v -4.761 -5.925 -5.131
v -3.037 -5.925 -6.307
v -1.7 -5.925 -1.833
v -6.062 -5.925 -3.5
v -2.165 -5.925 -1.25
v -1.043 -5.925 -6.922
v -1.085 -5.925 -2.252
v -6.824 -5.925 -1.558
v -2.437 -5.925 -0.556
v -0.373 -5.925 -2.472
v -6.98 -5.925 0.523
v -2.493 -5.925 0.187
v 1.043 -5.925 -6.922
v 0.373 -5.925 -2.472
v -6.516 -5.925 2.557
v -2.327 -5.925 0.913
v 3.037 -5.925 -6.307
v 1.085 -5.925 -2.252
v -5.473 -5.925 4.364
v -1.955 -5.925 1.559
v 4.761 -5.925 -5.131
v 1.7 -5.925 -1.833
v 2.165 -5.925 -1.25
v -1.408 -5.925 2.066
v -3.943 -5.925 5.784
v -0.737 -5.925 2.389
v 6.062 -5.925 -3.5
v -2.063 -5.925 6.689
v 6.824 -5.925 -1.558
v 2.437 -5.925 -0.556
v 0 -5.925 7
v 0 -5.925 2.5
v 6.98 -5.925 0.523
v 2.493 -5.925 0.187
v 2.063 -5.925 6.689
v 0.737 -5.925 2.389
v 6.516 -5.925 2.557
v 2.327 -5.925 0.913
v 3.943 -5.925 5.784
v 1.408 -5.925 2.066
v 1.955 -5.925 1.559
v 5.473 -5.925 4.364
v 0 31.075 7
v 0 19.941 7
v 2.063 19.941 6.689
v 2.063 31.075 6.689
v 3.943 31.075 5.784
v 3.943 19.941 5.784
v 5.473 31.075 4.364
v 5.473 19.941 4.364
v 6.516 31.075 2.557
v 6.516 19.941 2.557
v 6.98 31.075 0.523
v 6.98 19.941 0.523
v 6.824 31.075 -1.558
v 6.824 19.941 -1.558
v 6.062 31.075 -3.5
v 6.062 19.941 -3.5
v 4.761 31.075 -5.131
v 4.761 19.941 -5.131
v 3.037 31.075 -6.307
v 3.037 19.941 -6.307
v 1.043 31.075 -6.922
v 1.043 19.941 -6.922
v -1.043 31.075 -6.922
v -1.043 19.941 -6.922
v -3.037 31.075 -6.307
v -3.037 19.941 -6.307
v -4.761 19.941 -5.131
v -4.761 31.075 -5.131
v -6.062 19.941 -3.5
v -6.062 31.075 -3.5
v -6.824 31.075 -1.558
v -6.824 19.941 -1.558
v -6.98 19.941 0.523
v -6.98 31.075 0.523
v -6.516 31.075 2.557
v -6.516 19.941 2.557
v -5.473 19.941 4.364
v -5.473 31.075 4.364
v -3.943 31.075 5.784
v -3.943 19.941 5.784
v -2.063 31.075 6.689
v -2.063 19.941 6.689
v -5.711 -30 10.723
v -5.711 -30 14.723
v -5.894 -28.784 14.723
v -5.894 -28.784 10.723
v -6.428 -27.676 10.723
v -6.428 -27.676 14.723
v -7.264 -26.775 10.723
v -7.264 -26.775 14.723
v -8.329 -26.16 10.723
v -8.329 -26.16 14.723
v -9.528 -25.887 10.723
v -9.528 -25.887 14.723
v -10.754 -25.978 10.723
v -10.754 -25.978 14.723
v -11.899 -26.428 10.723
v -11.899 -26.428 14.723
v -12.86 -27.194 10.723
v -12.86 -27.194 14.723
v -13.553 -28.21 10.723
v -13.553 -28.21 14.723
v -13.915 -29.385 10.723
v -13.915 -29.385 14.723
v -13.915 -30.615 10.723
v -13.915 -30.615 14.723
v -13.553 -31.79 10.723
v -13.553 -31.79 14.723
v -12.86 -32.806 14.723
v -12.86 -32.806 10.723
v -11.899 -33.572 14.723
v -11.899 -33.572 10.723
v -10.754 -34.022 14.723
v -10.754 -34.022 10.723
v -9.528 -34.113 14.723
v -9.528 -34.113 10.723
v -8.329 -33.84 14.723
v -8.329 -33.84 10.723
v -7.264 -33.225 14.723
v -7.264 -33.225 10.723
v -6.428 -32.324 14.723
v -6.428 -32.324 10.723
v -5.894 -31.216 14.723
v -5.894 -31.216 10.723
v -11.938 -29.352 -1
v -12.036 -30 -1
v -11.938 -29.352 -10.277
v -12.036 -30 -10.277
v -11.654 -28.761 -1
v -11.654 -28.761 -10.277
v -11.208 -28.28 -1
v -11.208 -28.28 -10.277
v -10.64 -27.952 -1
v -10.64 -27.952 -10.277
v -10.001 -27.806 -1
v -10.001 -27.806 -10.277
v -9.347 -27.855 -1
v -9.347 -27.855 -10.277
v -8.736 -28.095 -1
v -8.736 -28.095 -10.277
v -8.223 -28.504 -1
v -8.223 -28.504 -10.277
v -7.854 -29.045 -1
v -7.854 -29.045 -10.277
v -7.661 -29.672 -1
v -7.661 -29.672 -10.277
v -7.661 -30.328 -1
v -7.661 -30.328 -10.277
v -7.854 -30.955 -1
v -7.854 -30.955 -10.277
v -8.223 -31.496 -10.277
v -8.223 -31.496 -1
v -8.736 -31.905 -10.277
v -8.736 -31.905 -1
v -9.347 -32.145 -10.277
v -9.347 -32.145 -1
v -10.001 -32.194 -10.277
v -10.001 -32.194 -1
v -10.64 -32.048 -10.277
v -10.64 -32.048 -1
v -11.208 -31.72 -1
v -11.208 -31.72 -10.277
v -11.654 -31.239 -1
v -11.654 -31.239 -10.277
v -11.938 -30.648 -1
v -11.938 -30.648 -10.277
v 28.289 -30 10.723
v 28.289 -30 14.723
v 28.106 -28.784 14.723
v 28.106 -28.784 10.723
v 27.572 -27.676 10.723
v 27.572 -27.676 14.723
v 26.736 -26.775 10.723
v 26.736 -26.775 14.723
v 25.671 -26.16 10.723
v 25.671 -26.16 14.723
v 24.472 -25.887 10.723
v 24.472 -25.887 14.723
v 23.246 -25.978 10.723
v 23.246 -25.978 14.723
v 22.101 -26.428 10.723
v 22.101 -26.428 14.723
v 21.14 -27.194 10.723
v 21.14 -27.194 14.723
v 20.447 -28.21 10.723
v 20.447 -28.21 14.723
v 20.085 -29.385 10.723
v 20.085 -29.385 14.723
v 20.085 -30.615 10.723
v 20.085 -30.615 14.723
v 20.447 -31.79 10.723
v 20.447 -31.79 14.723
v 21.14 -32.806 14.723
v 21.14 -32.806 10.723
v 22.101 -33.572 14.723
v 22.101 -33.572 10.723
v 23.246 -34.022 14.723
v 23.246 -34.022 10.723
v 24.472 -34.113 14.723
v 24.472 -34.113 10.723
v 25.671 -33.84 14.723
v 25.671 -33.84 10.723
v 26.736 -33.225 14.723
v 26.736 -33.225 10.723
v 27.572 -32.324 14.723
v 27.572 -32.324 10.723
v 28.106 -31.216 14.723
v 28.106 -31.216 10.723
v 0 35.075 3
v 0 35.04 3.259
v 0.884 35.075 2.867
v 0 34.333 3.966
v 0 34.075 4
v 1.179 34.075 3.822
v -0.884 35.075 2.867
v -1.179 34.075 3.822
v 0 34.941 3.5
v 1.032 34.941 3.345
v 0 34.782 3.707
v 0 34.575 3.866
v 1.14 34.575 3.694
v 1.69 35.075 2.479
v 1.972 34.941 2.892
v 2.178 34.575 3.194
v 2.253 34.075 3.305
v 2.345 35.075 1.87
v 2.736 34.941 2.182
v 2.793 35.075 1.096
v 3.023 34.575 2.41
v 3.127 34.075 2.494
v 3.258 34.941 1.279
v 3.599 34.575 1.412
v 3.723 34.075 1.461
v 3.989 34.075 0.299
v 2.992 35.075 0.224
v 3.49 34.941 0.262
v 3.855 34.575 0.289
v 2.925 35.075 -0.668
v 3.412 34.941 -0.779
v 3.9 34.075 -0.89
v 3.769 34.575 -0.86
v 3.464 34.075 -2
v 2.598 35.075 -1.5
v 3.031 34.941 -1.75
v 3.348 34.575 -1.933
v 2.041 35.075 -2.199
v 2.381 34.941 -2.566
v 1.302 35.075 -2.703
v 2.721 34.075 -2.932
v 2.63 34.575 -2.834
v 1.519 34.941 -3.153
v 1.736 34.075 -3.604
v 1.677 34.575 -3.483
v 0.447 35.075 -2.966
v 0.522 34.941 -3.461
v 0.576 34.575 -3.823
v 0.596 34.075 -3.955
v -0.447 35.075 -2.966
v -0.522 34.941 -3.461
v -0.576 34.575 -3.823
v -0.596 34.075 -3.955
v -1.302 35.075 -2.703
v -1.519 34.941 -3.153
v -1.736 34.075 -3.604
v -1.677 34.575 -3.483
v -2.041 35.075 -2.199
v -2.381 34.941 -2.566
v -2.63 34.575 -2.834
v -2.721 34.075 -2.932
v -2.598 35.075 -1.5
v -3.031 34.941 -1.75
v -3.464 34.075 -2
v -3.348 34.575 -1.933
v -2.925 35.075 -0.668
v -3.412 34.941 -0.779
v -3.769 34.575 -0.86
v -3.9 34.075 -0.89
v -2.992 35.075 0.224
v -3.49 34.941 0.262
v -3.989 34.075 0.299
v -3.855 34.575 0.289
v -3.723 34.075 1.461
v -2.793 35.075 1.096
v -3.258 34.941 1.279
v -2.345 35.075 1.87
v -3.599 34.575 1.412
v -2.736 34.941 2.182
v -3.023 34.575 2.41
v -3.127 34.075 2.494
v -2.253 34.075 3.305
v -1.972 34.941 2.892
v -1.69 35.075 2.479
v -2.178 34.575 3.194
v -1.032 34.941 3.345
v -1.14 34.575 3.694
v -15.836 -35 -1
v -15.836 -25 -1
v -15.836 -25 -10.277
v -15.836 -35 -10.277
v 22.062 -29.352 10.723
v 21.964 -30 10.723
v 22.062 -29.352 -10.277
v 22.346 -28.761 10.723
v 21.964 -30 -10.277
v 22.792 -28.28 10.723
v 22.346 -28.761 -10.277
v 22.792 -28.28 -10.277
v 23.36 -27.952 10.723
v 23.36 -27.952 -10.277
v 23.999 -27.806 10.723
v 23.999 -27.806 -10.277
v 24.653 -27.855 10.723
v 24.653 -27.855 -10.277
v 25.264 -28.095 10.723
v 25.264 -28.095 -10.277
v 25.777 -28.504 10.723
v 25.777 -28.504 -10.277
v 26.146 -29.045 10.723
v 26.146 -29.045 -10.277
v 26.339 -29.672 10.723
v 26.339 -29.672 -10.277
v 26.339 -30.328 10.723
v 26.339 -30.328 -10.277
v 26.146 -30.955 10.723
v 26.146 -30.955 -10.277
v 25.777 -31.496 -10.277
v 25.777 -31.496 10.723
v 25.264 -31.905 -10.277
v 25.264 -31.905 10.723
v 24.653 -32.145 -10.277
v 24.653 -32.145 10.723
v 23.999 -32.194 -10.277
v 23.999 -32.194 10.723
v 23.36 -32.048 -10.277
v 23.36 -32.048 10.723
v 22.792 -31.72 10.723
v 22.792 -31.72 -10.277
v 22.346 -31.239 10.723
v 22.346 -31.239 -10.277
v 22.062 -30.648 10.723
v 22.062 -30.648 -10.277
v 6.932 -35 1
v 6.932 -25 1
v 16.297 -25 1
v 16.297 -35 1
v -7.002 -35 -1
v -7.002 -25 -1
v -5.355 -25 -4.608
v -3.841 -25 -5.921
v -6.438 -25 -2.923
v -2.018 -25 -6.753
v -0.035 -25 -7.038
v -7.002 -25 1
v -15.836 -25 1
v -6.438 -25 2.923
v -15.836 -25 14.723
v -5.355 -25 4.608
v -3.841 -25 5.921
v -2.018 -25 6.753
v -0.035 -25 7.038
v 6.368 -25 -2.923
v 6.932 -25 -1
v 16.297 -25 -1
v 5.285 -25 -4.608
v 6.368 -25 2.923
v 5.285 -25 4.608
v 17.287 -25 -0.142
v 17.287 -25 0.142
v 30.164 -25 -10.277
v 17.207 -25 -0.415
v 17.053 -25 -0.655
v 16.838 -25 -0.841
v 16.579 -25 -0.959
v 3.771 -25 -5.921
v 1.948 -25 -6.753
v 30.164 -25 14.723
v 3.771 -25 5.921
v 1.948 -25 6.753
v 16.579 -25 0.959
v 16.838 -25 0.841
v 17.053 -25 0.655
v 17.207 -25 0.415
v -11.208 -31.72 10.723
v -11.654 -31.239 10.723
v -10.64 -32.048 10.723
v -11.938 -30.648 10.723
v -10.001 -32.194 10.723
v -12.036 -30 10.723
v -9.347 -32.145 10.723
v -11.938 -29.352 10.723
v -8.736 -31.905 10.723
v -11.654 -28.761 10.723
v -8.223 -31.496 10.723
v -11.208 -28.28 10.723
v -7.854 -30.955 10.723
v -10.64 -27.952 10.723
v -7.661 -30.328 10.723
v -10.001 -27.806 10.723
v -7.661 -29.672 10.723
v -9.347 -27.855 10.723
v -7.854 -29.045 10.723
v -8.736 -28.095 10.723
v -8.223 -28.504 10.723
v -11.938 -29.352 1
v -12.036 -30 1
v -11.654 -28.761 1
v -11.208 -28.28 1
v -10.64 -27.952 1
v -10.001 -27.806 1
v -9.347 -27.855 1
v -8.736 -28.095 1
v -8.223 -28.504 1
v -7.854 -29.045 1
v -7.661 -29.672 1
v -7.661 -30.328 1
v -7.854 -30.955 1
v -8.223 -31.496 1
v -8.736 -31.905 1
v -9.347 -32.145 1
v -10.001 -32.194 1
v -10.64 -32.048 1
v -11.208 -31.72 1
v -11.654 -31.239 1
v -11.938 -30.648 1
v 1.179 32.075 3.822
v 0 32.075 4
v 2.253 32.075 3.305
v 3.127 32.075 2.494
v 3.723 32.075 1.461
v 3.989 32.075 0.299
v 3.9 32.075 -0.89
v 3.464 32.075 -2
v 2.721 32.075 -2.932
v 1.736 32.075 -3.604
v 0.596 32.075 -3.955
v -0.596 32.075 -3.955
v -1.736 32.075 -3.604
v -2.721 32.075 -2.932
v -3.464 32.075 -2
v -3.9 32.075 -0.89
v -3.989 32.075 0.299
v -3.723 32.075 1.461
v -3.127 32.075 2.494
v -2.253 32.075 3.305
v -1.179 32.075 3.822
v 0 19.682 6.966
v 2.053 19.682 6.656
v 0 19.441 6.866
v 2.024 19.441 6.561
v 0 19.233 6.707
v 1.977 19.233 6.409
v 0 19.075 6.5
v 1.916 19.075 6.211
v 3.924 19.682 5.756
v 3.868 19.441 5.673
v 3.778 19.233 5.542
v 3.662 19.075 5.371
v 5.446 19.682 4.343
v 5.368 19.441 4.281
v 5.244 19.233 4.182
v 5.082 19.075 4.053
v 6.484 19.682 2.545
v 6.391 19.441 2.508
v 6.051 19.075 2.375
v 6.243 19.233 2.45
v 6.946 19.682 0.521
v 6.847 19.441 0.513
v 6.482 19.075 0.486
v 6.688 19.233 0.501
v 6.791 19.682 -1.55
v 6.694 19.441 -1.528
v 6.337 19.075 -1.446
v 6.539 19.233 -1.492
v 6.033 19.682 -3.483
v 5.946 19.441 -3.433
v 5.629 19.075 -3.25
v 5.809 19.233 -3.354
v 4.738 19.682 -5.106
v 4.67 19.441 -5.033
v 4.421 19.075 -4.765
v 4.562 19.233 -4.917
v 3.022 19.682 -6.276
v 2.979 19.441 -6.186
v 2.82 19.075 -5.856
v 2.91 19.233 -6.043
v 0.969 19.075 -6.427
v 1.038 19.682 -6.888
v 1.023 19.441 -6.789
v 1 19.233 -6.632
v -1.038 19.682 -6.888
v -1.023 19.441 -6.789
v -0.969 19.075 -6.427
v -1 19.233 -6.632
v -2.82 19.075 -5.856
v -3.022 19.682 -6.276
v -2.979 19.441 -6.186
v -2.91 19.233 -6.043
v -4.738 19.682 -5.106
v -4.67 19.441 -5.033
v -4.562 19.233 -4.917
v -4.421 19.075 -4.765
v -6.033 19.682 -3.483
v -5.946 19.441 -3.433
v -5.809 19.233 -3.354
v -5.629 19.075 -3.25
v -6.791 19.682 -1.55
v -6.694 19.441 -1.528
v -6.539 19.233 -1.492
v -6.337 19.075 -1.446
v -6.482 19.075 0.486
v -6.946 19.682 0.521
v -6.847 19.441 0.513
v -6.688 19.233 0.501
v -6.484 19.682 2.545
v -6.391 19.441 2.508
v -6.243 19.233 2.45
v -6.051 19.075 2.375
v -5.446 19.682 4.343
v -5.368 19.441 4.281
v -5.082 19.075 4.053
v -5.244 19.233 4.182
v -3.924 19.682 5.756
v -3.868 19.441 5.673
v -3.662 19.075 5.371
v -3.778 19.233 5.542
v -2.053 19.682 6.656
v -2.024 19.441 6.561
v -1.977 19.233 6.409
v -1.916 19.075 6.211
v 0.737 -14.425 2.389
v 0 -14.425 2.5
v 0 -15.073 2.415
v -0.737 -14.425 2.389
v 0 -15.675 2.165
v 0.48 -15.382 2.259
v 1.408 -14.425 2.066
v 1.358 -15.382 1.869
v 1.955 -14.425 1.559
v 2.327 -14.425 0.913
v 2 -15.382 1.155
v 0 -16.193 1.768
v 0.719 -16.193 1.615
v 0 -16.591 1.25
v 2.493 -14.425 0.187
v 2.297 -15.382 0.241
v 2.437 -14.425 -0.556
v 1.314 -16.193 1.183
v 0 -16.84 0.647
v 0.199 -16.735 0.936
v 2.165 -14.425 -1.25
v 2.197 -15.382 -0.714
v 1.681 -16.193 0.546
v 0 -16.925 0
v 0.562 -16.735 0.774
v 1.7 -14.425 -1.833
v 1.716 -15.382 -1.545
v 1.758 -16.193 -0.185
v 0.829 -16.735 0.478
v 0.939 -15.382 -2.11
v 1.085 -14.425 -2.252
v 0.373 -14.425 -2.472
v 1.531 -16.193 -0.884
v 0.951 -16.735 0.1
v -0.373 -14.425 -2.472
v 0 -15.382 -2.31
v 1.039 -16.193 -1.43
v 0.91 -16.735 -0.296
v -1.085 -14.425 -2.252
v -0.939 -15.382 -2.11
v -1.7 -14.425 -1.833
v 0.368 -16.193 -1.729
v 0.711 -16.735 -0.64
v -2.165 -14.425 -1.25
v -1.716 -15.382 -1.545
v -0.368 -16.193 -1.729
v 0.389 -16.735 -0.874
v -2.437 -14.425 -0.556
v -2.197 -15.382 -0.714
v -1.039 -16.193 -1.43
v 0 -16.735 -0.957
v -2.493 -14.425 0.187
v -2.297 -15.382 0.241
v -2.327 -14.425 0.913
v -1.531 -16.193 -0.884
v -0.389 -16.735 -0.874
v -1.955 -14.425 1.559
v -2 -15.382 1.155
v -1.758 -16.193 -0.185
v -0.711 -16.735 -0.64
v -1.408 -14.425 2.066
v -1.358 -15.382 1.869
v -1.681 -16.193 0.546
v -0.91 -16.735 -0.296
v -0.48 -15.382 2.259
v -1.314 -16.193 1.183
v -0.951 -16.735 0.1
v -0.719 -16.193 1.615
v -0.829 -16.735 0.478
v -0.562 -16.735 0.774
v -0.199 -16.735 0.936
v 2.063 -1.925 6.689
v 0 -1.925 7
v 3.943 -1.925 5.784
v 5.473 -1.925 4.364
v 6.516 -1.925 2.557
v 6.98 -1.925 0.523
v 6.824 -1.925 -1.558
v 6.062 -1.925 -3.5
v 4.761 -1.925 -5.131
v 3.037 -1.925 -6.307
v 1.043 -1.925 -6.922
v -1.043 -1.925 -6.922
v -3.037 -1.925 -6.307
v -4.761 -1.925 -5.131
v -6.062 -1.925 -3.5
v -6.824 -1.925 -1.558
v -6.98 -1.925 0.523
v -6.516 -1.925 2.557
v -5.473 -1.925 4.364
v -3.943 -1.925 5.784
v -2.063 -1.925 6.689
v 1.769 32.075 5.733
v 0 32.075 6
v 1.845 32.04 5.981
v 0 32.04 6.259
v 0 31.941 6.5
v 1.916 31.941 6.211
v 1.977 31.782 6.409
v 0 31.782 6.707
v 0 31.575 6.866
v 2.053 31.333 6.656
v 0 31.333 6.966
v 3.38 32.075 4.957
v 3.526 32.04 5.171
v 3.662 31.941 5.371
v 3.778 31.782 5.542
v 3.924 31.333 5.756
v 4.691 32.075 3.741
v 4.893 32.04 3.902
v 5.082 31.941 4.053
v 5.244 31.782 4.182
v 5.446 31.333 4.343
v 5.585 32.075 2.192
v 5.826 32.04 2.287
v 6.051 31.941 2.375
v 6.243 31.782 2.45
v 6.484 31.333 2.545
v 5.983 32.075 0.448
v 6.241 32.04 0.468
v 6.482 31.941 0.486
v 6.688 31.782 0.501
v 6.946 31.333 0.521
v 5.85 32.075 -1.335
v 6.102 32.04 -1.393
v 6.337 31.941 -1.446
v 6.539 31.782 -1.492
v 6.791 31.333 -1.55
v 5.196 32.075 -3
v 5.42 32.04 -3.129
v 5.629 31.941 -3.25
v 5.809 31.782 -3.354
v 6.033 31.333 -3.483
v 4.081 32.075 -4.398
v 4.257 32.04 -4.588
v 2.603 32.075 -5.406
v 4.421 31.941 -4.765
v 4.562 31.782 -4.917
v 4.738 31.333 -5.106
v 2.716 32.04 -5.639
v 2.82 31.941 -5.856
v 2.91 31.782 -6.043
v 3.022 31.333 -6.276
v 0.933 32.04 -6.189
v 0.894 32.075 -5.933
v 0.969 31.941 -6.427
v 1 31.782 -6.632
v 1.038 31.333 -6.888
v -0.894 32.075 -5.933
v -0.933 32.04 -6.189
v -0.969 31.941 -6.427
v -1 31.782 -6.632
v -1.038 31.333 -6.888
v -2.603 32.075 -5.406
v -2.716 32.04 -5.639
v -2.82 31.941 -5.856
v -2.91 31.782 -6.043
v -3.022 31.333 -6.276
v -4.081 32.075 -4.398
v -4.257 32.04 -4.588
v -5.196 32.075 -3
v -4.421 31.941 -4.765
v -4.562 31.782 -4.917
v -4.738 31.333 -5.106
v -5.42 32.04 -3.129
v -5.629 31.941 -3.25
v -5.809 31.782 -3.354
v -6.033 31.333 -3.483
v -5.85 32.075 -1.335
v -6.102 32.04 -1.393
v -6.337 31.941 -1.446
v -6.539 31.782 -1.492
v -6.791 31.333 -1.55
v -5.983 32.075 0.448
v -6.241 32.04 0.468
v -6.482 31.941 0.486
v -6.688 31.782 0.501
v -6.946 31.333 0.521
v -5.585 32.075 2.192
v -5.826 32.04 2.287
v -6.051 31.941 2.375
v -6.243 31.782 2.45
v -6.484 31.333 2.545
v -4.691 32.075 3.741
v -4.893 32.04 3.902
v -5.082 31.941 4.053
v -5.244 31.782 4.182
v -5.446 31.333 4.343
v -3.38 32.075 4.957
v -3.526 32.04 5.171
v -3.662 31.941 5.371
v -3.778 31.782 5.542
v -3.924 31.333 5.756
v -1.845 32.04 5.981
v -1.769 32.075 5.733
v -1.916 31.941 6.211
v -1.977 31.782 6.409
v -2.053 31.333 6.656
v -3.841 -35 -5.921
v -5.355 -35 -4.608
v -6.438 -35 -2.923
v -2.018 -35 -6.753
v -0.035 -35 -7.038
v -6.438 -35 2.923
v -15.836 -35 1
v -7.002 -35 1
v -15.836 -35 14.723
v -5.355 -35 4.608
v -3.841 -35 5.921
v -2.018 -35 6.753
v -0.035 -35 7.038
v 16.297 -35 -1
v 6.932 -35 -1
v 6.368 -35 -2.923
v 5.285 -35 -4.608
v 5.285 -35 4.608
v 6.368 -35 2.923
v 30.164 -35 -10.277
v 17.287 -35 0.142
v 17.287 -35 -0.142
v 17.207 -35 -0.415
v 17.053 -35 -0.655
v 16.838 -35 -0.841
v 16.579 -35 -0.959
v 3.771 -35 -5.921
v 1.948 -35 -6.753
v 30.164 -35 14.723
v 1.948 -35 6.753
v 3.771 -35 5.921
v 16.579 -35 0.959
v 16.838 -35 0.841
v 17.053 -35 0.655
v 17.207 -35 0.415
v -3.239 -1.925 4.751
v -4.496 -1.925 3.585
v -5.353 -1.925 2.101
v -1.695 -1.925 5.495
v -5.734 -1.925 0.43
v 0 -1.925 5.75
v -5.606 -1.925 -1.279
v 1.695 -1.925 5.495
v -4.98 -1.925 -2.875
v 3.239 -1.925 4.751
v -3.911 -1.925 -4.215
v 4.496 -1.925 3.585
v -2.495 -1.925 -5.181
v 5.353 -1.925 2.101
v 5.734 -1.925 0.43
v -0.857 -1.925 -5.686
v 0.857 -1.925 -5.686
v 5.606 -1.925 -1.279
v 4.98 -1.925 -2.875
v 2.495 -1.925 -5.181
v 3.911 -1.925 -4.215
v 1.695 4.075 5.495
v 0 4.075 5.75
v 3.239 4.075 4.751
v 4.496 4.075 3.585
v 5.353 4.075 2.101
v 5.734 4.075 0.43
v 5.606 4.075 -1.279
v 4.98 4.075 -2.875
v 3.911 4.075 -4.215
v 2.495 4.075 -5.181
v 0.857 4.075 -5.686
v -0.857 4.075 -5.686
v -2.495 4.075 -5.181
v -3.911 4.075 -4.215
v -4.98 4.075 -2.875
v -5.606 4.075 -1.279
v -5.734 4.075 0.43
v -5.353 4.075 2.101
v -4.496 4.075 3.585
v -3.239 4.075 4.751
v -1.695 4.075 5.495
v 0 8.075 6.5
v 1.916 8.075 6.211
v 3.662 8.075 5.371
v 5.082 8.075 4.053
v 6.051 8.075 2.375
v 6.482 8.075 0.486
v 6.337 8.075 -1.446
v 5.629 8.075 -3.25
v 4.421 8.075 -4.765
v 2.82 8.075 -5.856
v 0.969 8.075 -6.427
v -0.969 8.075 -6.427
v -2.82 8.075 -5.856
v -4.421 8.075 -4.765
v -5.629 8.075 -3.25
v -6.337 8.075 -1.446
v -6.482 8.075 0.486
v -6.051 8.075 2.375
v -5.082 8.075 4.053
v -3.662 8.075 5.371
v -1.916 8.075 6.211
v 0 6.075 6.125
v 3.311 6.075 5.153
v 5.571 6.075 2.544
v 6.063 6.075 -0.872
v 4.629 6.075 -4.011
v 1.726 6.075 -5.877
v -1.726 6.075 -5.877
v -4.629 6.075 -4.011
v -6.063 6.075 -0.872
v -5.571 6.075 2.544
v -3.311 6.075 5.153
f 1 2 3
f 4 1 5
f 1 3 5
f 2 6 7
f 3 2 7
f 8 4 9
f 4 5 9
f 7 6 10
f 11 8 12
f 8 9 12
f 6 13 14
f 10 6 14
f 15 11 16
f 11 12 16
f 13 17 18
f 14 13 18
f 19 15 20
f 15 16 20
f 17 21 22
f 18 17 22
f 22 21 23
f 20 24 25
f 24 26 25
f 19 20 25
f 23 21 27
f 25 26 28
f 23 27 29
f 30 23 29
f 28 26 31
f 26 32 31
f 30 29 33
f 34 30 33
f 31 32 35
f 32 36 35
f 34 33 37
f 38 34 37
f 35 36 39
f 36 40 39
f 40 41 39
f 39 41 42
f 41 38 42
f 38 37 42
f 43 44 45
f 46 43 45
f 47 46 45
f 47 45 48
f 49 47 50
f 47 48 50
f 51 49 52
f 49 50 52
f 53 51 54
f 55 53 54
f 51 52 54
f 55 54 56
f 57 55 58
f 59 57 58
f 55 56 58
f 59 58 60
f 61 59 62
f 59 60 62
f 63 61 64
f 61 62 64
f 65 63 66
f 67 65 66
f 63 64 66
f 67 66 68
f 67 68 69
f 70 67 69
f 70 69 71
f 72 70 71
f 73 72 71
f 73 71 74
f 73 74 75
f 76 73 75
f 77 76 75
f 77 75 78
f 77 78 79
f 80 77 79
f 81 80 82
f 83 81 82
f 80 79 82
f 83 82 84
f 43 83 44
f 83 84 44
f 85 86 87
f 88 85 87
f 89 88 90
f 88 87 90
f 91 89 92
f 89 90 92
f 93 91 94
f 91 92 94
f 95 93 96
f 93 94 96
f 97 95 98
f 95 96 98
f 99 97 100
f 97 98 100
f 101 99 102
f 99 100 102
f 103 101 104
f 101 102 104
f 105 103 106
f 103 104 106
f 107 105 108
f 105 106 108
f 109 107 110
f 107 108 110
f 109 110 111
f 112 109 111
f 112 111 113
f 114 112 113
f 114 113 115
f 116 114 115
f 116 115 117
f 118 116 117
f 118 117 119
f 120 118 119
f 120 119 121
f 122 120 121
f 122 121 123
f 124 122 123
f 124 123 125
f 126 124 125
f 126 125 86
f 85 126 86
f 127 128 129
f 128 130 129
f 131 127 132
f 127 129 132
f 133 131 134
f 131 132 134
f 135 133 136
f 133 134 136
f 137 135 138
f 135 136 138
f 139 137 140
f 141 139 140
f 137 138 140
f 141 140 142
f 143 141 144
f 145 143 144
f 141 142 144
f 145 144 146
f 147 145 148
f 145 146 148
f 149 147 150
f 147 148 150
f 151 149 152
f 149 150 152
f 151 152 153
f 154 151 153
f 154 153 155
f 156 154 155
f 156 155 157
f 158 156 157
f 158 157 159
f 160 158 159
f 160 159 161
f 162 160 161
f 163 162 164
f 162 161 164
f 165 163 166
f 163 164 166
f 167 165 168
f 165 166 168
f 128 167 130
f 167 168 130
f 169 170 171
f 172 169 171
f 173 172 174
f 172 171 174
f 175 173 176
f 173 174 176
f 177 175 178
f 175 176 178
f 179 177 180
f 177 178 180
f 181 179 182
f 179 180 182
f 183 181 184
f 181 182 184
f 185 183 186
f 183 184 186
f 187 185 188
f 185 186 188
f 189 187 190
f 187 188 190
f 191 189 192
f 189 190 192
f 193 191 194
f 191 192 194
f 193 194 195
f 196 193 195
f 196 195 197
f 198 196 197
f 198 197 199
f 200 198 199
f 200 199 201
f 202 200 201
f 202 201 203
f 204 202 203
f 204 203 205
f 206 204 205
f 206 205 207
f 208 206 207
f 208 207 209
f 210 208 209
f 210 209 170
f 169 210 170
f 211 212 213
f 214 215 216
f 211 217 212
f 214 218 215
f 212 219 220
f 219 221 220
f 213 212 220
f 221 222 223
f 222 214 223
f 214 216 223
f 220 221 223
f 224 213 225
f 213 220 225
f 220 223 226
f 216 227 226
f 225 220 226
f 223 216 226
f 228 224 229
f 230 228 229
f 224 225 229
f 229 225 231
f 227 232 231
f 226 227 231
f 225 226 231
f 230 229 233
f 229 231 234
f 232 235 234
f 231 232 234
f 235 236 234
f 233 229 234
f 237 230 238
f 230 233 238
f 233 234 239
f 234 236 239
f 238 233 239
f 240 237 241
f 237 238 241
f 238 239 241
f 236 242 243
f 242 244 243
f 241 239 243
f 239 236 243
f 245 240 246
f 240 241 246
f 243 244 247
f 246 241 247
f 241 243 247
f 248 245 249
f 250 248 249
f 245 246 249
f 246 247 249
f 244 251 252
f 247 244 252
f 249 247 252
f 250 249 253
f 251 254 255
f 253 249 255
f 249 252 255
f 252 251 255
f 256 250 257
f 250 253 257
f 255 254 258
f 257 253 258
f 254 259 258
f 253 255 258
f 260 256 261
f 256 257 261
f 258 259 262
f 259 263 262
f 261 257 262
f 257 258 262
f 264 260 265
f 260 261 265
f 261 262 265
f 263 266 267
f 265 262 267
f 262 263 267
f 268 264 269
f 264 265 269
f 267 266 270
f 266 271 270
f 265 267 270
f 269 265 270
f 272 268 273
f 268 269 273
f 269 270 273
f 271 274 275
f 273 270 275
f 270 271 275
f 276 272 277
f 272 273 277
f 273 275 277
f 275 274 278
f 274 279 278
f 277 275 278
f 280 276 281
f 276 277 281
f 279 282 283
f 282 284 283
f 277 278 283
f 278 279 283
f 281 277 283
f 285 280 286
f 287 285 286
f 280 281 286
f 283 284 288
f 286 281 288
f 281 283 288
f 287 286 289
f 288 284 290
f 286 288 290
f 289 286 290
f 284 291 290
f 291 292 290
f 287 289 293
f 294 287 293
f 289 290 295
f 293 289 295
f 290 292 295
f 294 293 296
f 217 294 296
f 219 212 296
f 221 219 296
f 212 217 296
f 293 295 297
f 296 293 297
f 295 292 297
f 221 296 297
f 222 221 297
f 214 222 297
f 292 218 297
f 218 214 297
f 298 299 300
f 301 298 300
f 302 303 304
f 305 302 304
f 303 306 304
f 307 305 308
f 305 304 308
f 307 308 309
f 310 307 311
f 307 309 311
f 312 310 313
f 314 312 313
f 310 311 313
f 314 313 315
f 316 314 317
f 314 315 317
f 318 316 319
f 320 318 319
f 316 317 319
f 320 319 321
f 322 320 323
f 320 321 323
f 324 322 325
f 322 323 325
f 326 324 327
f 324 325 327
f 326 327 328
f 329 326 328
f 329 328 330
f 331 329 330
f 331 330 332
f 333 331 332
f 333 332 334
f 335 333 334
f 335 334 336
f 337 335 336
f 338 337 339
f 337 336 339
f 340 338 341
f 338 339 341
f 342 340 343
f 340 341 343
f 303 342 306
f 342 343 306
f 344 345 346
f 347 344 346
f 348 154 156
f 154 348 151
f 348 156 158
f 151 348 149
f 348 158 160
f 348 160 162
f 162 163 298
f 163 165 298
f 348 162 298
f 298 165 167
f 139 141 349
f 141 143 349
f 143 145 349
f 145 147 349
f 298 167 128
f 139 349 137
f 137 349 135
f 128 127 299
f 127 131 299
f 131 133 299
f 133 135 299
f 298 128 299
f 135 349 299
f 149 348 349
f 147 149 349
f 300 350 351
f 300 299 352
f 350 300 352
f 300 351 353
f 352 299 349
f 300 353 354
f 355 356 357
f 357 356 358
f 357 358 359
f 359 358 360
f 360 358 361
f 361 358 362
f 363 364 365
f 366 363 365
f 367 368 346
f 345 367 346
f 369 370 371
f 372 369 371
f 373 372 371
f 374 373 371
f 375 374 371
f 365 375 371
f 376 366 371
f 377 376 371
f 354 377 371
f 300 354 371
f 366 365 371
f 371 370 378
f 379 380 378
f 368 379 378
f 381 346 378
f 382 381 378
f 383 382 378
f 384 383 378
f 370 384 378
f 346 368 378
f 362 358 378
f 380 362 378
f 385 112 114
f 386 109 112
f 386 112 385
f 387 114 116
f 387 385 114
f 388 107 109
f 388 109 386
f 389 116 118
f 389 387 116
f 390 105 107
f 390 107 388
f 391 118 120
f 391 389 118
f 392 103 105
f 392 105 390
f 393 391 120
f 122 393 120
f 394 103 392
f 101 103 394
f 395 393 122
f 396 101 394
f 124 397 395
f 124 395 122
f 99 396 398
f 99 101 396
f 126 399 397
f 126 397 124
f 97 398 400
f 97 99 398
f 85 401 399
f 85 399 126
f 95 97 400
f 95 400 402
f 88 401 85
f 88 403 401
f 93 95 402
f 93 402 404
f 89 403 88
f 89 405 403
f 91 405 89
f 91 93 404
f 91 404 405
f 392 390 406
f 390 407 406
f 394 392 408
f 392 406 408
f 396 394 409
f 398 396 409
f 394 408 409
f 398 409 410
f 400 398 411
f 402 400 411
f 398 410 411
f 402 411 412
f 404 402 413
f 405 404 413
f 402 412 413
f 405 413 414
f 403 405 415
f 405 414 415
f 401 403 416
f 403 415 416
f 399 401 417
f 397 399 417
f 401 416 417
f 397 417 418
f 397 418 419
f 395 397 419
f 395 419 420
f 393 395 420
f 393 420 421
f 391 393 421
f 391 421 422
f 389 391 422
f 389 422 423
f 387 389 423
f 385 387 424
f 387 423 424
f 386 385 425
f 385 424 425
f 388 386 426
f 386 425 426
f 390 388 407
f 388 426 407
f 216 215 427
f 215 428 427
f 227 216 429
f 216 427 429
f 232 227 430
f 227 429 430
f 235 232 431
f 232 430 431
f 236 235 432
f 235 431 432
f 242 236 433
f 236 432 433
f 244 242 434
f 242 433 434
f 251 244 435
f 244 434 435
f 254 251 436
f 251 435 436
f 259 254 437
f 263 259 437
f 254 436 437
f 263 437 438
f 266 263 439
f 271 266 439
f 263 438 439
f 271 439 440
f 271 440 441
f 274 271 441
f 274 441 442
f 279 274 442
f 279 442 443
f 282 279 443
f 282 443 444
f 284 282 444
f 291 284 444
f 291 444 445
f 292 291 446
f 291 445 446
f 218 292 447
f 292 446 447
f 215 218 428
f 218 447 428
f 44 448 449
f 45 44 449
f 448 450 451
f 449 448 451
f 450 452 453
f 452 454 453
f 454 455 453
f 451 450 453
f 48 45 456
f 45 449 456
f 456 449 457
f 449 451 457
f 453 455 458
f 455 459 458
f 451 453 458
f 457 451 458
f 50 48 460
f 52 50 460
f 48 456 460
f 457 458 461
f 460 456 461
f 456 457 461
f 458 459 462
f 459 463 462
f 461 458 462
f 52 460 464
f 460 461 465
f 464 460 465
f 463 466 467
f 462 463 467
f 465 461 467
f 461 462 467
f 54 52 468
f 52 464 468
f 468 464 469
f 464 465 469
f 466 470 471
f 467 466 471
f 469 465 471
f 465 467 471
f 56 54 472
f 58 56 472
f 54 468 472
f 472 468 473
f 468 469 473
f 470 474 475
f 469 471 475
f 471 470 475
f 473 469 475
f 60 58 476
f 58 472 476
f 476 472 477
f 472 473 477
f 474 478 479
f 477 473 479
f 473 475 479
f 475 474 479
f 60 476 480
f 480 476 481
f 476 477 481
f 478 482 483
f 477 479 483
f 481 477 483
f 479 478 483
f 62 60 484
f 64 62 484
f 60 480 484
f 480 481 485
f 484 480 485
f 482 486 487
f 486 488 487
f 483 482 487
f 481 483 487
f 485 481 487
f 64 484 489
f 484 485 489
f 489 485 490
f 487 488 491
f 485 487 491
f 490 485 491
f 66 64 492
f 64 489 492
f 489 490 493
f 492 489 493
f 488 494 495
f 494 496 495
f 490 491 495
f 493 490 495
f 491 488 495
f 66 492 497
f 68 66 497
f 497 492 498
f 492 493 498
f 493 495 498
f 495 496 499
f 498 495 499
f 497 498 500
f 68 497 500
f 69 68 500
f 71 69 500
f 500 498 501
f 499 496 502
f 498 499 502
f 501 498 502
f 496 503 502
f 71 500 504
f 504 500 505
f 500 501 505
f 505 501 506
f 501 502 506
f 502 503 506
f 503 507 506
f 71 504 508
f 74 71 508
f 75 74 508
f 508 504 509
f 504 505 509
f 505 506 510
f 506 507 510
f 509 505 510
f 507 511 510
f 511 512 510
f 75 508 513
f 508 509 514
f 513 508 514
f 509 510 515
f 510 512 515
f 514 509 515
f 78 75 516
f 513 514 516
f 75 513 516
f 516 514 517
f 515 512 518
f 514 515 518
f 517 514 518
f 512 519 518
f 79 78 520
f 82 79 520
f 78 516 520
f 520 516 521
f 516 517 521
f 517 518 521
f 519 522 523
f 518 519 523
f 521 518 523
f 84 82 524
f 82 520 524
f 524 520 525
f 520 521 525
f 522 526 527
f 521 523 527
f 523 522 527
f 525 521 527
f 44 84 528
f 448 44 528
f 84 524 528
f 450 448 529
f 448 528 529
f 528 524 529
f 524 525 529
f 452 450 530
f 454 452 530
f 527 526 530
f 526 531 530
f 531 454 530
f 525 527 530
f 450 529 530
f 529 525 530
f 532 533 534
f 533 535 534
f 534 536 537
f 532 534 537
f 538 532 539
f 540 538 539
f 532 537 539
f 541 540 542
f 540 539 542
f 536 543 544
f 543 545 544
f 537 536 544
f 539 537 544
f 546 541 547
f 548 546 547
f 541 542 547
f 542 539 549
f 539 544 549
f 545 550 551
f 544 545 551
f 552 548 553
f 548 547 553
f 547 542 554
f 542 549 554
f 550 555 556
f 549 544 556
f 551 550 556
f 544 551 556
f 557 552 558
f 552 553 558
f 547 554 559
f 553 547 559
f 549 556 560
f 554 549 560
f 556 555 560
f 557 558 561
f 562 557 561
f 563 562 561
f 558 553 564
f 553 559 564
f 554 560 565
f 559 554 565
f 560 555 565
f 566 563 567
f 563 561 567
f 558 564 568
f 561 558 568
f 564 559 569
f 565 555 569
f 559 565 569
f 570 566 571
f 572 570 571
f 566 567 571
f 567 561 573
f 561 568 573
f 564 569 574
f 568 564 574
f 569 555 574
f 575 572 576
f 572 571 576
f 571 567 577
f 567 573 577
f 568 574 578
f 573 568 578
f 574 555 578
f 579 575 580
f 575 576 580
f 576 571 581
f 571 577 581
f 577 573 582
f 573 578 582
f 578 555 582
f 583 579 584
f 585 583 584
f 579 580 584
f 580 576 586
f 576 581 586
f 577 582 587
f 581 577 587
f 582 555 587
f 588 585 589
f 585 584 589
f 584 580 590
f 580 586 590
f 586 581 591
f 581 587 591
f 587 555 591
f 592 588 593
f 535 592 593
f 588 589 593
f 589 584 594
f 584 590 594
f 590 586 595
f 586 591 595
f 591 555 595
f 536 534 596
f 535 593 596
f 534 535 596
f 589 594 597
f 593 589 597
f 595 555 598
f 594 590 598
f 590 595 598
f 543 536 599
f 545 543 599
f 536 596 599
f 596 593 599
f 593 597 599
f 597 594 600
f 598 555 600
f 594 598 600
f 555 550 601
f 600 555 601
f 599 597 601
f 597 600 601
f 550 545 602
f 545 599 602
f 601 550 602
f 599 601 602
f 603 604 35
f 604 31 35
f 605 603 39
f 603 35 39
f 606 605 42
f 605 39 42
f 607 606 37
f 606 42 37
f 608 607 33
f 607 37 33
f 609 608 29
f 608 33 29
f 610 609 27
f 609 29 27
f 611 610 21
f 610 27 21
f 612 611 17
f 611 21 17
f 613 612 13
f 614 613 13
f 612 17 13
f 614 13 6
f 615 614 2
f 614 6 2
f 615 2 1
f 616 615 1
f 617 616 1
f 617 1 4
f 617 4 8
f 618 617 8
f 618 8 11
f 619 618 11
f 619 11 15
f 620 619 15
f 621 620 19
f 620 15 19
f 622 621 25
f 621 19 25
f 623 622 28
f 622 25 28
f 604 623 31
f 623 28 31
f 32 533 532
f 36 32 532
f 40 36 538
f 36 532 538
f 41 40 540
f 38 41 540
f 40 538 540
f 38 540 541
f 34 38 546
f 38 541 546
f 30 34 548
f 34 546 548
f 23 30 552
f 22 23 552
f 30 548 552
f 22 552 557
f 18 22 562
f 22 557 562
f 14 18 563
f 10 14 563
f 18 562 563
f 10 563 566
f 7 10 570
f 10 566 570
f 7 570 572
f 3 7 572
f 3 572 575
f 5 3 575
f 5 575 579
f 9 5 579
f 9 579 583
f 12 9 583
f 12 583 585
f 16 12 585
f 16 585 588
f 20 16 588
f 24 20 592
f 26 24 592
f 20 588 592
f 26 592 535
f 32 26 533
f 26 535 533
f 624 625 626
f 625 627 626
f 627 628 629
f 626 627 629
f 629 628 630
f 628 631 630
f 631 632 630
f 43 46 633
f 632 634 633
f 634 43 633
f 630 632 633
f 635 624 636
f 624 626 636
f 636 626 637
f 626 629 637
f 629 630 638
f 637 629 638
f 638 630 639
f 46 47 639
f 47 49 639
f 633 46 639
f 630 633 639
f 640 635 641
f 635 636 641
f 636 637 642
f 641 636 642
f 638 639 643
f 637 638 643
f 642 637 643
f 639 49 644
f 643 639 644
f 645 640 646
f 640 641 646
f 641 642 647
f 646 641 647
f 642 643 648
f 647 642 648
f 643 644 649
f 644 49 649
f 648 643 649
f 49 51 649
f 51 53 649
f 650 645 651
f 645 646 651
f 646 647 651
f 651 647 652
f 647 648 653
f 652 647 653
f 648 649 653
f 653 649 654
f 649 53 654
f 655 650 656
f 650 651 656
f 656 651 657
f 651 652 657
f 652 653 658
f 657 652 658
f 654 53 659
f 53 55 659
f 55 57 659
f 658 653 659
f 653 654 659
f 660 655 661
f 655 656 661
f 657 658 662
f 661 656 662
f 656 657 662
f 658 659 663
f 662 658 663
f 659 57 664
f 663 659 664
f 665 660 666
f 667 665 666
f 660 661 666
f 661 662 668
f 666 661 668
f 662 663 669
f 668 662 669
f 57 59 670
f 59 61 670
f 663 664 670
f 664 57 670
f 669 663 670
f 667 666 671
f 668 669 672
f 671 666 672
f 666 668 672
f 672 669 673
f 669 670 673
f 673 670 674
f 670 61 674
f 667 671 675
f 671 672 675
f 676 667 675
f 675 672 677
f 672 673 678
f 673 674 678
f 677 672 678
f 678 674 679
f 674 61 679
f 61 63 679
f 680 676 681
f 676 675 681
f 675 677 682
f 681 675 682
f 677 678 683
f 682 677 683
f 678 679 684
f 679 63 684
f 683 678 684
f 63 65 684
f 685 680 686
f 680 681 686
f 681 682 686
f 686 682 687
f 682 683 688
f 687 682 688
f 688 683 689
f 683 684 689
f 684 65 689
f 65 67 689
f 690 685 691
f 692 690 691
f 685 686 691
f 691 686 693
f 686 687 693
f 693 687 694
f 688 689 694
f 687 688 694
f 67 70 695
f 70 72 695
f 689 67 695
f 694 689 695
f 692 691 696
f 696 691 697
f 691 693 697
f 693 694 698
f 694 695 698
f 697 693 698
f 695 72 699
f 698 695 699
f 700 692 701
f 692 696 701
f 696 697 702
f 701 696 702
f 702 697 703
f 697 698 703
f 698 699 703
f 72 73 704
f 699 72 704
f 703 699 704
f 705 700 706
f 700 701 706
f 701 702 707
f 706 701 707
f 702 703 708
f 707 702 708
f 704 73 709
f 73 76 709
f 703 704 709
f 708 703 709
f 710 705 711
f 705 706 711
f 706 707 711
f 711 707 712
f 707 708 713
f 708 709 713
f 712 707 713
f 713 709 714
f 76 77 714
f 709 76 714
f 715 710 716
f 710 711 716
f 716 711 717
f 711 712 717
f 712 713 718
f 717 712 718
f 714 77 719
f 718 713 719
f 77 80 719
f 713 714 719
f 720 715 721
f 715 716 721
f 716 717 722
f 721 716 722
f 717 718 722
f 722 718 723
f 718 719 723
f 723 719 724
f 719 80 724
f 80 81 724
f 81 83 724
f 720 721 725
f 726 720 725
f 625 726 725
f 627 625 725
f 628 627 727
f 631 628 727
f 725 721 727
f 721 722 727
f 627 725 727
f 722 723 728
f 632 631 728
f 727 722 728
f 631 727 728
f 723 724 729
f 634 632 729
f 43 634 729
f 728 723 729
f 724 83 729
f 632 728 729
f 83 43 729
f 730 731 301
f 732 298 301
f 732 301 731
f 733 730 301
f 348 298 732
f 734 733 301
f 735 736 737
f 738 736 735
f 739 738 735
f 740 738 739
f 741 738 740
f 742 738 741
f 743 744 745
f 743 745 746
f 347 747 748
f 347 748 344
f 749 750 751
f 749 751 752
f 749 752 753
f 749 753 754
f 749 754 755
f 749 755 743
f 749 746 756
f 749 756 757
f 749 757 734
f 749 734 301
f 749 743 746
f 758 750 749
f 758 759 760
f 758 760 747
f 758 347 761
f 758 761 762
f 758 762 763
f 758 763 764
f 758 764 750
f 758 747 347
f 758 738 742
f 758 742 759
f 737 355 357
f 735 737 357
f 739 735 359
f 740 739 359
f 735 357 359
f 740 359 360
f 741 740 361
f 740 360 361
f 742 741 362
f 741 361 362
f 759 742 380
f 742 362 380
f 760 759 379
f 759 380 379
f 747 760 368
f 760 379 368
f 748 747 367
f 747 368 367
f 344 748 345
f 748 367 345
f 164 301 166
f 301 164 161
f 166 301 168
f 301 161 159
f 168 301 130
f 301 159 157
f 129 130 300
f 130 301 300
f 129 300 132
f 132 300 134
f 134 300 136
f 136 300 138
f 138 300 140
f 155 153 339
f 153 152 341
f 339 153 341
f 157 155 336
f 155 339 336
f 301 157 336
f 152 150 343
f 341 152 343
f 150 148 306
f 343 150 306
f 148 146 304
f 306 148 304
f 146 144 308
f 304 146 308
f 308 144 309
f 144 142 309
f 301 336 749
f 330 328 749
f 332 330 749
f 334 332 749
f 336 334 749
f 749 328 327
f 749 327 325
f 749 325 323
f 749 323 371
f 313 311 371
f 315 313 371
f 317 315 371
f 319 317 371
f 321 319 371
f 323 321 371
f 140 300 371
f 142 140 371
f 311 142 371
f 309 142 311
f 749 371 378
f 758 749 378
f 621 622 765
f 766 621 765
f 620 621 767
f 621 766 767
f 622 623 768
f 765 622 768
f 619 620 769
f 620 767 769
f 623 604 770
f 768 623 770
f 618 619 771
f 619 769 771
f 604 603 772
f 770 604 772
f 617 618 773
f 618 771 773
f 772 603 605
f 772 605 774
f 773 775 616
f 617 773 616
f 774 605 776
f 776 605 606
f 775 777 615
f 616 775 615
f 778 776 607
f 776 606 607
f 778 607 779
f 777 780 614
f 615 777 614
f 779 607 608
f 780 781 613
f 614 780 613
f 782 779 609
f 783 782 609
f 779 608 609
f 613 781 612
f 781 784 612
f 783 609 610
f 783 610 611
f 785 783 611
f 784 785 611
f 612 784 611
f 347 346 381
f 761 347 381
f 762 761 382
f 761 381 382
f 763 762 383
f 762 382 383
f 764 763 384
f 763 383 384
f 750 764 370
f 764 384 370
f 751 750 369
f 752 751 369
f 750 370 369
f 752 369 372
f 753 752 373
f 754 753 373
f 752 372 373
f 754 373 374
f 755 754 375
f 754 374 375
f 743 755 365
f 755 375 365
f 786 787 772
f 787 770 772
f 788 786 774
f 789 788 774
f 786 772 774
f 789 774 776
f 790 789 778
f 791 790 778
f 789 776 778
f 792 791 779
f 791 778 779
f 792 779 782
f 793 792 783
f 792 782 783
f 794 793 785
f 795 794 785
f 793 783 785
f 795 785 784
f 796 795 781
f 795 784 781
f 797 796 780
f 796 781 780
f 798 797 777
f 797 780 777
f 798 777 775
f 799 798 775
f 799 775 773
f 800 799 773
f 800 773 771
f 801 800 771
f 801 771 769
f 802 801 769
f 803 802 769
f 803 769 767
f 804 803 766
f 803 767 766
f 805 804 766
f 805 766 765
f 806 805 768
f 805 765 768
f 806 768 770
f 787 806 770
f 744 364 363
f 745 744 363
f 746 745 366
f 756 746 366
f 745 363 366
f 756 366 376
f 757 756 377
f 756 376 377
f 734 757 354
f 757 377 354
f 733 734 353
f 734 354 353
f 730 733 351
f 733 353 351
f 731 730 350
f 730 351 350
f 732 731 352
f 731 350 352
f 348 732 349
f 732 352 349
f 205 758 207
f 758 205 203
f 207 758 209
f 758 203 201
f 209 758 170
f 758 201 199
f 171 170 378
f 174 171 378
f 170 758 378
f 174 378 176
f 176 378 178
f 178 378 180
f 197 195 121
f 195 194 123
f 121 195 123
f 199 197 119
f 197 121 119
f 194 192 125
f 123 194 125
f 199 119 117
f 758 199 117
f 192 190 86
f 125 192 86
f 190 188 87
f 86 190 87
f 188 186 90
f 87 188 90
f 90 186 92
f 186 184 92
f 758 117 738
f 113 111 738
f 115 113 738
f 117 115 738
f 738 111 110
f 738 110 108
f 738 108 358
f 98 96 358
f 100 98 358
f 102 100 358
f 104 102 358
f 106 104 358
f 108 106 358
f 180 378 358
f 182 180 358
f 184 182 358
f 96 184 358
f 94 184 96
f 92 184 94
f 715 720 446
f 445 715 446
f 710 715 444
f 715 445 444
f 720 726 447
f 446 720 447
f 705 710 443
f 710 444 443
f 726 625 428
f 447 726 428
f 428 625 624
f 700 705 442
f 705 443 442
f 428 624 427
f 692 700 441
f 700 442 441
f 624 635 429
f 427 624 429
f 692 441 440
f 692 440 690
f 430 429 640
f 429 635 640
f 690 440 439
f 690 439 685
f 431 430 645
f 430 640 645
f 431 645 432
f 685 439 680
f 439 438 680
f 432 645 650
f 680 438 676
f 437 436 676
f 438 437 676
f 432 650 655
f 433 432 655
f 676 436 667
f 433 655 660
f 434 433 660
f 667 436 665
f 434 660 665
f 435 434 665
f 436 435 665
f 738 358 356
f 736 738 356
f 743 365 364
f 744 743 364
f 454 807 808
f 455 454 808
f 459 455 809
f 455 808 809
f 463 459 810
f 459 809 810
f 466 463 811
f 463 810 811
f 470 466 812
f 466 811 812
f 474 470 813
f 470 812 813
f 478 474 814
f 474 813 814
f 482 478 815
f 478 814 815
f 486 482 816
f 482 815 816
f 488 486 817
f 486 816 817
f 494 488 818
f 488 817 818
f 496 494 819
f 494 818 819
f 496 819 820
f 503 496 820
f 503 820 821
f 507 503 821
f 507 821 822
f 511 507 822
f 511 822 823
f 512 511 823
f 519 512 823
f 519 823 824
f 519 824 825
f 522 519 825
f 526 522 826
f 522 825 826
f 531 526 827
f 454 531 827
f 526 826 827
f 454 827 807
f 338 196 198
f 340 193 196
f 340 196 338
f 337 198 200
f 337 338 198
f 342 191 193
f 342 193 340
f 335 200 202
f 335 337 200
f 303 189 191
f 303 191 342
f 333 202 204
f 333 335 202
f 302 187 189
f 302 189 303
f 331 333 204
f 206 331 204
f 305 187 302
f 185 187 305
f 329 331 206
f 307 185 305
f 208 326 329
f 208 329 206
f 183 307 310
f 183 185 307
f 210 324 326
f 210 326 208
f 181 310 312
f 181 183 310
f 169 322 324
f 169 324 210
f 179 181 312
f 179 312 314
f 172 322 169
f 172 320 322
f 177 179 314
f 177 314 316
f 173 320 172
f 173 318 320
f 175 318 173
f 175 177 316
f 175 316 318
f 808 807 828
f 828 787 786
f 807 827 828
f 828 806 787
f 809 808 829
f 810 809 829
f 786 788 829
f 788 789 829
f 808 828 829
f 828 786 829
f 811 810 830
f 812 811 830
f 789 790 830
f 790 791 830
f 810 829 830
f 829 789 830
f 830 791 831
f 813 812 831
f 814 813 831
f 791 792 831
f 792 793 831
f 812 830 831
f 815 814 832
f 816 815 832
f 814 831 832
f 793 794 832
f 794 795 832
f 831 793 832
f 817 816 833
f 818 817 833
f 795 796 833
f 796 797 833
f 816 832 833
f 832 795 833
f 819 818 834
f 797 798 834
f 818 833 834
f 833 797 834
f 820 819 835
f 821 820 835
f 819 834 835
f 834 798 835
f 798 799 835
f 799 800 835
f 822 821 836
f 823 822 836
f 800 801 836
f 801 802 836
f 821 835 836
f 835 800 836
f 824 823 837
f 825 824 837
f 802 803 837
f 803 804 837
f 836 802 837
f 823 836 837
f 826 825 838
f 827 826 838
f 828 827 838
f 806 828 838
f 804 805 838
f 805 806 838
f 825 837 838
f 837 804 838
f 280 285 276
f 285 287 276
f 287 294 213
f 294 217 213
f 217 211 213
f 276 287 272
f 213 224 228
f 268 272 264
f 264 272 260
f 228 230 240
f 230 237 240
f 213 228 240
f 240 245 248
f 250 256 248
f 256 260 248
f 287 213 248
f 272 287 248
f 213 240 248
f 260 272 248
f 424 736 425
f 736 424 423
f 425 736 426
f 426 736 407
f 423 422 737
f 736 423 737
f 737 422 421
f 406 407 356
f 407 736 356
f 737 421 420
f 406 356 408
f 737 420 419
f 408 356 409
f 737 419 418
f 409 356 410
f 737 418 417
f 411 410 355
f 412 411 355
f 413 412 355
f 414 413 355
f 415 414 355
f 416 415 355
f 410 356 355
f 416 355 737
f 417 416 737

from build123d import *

# Parameters (mm, degrees)
F3_R           = 2.5
F6_DEPTH       = 10
F8_D           = 4.4
F8_CBORE_D     = 8.25
F8_CBORE_DEPTH = 4


# Not quite as in the source:
# - a fillet or chamfer that OpenCascade refuses, or shapes differently, is made with other operations: its cross-section is extruded or revolved along the edge and cut away or added


with BuildPart() as f1:
    # F0 (on Right) → F1 (revolve)
    with BuildSketch(Plane.YZ):
        Polygon((8.0745064616, 6.5), (4.0745064616, 5.75), (-1.9254935384, 5.75), (-1.9254935384, 7), (-5.9254935384, 7), (-5.9254935384, 2.5), (-16.9254935384, 2.5), (-16.9254935384, 0), (35.0745064616, 0), (35.0745064616, 4), (32.0745064616, 4), (32.0745064616, 7), (19.0745064616, 7), (19.0745064616, 6.5), align=None)
    revolve(axis=Axis((0, 9.0745064616, 0), (0, 1, 0)))

    # F2: fillet of radius 1 on 3 edges, made by hand

    # F2_s1 → F2_t2 (revolve, cut)
    with BuildSketch(Plane.YZ):
        with BuildLine():
            ThreePointArc((35.0745064616, 3), (34.7816132428, 3.7071067812), (34.0745064616, 4))
            Line((34.0745064616, 4), (34.0745064616, 4.02))
            Line((34.0745064616, 4.02), (35.0945064616, 4.02))
            Line((35.0945064616, 4.02), (35.0945064616, 3))
            Line((35.0945064616, 3), (35.0745064616, 3))
        make_face()
    revolve(axis=Axis((0, 35.0745064616, 0), (0, 1, 0)), mode=Mode.SUBTRACT)

    # F2_s3 → F2_t4 (revolve, cut)
    with BuildSketch(Plane.YZ):
        with BuildLine():
            ThreePointArc((32.0745064616, 6), (31.7816132428, 6.7071067812), (31.0745064616, 7))
            Line((31.0745064616, 7), (31.0745064616, 7.02))
            Line((31.0745064616, 7.02), (32.0945064616, 7.02))
            Line((32.0945064616, 7.02), (32.0945064616, 6))
            Line((32.0945064616, 6), (32.0745064616, 6))
        make_face()
    revolve(axis=Axis((0, 32.0745064616, 0), (0, 1, 0)), mode=Mode.SUBTRACT)

    # F2_s5 → F2_t6 (revolve, cut)
    with BuildSketch(Plane.YZ):
        with BuildLine():
            ThreePointArc((19.9405318654, 7), (19.4405318654, 6.8660254038), (19.0745064616, 6.5))
            Line((19.0745064616, 6.5), (19.0571859535, 6.51))
            ThreePointArc((19.0571859535, 6.51), (19.0545064616, 6.75), (19.0545064616, 7))
            Line((19.0545064616, 7), (19.0745064616, 7.02))
            Line((19.0745064616, 7.02), (19.9405318654, 7.02))
            Line((19.9405318654, 7.02), (19.9405318654, 7))
        make_face()
    revolve(axis=Axis((0, 19.0745064616, 0), (0, 1, 0)), mode=Mode.SUBTRACT)

    # F3
    f3_edges = [f1.edges().sort_by_distance(p)[0] for p in [
        (0, -16.925494, -2.5),
    ]]
    fillet(f3_edges, radius=F3_R)


with BuildPart() as f6:
    # F5 (on offset) → F6 (new body)
    with BuildSketch(Plane.XZ.offset(25)):
        with BuildLine():
            Line((-15.8362010978, -10.2766921259), (30.1637989022, -10.2766921259))
            Line((30.1637989022, -10.2766921259), (30.1637989022, 14.7233078741))
            Line((30.1637989022, 14.7233078741), (-15.8362010978, 14.7233078741))
            Line((-15.8362010978, 14.7233078741), (-15.8362010978, 1))
            Line((-15.8362010978, 1), (-7.0018163238, 1))
            ThreePointArc((-7.0018163238, 1), (-0.0350231516, 7.0381962962), (6.9317700206, 1))
            Line((6.9317700206, 1), (16.2971732207, 1))
            ThreePointArc((16.2971732207, 1), (17.2971732207, 0), (16.2971732207, -1))
            Line((16.2971732207, -1), (6.9317700206, -1))
            ThreePointArc((6.9317700206, -1), (-0.0350231516, -7.0381962962), (-7.0018163238, -1))
            Line((-7.0018163238, -1), (-15.8362010978, -1))
            Line((-15.8362010978, -1), (-15.8362010978, -10.2766921259))
        make_face()
    extrude(amount=F6_DEPTH)

    # F8 (through all)
    with Locations(Plane.XY.offset(14.7233078741)):
        with Locations((24.1637989022, -30), (-9.8362010978, -30)):
            CounterBoreHole(F8_D / 2, F8_CBORE_D / 2, F8_CBORE_DEPTH)


solid = Compound([f1.part, f6.part])
